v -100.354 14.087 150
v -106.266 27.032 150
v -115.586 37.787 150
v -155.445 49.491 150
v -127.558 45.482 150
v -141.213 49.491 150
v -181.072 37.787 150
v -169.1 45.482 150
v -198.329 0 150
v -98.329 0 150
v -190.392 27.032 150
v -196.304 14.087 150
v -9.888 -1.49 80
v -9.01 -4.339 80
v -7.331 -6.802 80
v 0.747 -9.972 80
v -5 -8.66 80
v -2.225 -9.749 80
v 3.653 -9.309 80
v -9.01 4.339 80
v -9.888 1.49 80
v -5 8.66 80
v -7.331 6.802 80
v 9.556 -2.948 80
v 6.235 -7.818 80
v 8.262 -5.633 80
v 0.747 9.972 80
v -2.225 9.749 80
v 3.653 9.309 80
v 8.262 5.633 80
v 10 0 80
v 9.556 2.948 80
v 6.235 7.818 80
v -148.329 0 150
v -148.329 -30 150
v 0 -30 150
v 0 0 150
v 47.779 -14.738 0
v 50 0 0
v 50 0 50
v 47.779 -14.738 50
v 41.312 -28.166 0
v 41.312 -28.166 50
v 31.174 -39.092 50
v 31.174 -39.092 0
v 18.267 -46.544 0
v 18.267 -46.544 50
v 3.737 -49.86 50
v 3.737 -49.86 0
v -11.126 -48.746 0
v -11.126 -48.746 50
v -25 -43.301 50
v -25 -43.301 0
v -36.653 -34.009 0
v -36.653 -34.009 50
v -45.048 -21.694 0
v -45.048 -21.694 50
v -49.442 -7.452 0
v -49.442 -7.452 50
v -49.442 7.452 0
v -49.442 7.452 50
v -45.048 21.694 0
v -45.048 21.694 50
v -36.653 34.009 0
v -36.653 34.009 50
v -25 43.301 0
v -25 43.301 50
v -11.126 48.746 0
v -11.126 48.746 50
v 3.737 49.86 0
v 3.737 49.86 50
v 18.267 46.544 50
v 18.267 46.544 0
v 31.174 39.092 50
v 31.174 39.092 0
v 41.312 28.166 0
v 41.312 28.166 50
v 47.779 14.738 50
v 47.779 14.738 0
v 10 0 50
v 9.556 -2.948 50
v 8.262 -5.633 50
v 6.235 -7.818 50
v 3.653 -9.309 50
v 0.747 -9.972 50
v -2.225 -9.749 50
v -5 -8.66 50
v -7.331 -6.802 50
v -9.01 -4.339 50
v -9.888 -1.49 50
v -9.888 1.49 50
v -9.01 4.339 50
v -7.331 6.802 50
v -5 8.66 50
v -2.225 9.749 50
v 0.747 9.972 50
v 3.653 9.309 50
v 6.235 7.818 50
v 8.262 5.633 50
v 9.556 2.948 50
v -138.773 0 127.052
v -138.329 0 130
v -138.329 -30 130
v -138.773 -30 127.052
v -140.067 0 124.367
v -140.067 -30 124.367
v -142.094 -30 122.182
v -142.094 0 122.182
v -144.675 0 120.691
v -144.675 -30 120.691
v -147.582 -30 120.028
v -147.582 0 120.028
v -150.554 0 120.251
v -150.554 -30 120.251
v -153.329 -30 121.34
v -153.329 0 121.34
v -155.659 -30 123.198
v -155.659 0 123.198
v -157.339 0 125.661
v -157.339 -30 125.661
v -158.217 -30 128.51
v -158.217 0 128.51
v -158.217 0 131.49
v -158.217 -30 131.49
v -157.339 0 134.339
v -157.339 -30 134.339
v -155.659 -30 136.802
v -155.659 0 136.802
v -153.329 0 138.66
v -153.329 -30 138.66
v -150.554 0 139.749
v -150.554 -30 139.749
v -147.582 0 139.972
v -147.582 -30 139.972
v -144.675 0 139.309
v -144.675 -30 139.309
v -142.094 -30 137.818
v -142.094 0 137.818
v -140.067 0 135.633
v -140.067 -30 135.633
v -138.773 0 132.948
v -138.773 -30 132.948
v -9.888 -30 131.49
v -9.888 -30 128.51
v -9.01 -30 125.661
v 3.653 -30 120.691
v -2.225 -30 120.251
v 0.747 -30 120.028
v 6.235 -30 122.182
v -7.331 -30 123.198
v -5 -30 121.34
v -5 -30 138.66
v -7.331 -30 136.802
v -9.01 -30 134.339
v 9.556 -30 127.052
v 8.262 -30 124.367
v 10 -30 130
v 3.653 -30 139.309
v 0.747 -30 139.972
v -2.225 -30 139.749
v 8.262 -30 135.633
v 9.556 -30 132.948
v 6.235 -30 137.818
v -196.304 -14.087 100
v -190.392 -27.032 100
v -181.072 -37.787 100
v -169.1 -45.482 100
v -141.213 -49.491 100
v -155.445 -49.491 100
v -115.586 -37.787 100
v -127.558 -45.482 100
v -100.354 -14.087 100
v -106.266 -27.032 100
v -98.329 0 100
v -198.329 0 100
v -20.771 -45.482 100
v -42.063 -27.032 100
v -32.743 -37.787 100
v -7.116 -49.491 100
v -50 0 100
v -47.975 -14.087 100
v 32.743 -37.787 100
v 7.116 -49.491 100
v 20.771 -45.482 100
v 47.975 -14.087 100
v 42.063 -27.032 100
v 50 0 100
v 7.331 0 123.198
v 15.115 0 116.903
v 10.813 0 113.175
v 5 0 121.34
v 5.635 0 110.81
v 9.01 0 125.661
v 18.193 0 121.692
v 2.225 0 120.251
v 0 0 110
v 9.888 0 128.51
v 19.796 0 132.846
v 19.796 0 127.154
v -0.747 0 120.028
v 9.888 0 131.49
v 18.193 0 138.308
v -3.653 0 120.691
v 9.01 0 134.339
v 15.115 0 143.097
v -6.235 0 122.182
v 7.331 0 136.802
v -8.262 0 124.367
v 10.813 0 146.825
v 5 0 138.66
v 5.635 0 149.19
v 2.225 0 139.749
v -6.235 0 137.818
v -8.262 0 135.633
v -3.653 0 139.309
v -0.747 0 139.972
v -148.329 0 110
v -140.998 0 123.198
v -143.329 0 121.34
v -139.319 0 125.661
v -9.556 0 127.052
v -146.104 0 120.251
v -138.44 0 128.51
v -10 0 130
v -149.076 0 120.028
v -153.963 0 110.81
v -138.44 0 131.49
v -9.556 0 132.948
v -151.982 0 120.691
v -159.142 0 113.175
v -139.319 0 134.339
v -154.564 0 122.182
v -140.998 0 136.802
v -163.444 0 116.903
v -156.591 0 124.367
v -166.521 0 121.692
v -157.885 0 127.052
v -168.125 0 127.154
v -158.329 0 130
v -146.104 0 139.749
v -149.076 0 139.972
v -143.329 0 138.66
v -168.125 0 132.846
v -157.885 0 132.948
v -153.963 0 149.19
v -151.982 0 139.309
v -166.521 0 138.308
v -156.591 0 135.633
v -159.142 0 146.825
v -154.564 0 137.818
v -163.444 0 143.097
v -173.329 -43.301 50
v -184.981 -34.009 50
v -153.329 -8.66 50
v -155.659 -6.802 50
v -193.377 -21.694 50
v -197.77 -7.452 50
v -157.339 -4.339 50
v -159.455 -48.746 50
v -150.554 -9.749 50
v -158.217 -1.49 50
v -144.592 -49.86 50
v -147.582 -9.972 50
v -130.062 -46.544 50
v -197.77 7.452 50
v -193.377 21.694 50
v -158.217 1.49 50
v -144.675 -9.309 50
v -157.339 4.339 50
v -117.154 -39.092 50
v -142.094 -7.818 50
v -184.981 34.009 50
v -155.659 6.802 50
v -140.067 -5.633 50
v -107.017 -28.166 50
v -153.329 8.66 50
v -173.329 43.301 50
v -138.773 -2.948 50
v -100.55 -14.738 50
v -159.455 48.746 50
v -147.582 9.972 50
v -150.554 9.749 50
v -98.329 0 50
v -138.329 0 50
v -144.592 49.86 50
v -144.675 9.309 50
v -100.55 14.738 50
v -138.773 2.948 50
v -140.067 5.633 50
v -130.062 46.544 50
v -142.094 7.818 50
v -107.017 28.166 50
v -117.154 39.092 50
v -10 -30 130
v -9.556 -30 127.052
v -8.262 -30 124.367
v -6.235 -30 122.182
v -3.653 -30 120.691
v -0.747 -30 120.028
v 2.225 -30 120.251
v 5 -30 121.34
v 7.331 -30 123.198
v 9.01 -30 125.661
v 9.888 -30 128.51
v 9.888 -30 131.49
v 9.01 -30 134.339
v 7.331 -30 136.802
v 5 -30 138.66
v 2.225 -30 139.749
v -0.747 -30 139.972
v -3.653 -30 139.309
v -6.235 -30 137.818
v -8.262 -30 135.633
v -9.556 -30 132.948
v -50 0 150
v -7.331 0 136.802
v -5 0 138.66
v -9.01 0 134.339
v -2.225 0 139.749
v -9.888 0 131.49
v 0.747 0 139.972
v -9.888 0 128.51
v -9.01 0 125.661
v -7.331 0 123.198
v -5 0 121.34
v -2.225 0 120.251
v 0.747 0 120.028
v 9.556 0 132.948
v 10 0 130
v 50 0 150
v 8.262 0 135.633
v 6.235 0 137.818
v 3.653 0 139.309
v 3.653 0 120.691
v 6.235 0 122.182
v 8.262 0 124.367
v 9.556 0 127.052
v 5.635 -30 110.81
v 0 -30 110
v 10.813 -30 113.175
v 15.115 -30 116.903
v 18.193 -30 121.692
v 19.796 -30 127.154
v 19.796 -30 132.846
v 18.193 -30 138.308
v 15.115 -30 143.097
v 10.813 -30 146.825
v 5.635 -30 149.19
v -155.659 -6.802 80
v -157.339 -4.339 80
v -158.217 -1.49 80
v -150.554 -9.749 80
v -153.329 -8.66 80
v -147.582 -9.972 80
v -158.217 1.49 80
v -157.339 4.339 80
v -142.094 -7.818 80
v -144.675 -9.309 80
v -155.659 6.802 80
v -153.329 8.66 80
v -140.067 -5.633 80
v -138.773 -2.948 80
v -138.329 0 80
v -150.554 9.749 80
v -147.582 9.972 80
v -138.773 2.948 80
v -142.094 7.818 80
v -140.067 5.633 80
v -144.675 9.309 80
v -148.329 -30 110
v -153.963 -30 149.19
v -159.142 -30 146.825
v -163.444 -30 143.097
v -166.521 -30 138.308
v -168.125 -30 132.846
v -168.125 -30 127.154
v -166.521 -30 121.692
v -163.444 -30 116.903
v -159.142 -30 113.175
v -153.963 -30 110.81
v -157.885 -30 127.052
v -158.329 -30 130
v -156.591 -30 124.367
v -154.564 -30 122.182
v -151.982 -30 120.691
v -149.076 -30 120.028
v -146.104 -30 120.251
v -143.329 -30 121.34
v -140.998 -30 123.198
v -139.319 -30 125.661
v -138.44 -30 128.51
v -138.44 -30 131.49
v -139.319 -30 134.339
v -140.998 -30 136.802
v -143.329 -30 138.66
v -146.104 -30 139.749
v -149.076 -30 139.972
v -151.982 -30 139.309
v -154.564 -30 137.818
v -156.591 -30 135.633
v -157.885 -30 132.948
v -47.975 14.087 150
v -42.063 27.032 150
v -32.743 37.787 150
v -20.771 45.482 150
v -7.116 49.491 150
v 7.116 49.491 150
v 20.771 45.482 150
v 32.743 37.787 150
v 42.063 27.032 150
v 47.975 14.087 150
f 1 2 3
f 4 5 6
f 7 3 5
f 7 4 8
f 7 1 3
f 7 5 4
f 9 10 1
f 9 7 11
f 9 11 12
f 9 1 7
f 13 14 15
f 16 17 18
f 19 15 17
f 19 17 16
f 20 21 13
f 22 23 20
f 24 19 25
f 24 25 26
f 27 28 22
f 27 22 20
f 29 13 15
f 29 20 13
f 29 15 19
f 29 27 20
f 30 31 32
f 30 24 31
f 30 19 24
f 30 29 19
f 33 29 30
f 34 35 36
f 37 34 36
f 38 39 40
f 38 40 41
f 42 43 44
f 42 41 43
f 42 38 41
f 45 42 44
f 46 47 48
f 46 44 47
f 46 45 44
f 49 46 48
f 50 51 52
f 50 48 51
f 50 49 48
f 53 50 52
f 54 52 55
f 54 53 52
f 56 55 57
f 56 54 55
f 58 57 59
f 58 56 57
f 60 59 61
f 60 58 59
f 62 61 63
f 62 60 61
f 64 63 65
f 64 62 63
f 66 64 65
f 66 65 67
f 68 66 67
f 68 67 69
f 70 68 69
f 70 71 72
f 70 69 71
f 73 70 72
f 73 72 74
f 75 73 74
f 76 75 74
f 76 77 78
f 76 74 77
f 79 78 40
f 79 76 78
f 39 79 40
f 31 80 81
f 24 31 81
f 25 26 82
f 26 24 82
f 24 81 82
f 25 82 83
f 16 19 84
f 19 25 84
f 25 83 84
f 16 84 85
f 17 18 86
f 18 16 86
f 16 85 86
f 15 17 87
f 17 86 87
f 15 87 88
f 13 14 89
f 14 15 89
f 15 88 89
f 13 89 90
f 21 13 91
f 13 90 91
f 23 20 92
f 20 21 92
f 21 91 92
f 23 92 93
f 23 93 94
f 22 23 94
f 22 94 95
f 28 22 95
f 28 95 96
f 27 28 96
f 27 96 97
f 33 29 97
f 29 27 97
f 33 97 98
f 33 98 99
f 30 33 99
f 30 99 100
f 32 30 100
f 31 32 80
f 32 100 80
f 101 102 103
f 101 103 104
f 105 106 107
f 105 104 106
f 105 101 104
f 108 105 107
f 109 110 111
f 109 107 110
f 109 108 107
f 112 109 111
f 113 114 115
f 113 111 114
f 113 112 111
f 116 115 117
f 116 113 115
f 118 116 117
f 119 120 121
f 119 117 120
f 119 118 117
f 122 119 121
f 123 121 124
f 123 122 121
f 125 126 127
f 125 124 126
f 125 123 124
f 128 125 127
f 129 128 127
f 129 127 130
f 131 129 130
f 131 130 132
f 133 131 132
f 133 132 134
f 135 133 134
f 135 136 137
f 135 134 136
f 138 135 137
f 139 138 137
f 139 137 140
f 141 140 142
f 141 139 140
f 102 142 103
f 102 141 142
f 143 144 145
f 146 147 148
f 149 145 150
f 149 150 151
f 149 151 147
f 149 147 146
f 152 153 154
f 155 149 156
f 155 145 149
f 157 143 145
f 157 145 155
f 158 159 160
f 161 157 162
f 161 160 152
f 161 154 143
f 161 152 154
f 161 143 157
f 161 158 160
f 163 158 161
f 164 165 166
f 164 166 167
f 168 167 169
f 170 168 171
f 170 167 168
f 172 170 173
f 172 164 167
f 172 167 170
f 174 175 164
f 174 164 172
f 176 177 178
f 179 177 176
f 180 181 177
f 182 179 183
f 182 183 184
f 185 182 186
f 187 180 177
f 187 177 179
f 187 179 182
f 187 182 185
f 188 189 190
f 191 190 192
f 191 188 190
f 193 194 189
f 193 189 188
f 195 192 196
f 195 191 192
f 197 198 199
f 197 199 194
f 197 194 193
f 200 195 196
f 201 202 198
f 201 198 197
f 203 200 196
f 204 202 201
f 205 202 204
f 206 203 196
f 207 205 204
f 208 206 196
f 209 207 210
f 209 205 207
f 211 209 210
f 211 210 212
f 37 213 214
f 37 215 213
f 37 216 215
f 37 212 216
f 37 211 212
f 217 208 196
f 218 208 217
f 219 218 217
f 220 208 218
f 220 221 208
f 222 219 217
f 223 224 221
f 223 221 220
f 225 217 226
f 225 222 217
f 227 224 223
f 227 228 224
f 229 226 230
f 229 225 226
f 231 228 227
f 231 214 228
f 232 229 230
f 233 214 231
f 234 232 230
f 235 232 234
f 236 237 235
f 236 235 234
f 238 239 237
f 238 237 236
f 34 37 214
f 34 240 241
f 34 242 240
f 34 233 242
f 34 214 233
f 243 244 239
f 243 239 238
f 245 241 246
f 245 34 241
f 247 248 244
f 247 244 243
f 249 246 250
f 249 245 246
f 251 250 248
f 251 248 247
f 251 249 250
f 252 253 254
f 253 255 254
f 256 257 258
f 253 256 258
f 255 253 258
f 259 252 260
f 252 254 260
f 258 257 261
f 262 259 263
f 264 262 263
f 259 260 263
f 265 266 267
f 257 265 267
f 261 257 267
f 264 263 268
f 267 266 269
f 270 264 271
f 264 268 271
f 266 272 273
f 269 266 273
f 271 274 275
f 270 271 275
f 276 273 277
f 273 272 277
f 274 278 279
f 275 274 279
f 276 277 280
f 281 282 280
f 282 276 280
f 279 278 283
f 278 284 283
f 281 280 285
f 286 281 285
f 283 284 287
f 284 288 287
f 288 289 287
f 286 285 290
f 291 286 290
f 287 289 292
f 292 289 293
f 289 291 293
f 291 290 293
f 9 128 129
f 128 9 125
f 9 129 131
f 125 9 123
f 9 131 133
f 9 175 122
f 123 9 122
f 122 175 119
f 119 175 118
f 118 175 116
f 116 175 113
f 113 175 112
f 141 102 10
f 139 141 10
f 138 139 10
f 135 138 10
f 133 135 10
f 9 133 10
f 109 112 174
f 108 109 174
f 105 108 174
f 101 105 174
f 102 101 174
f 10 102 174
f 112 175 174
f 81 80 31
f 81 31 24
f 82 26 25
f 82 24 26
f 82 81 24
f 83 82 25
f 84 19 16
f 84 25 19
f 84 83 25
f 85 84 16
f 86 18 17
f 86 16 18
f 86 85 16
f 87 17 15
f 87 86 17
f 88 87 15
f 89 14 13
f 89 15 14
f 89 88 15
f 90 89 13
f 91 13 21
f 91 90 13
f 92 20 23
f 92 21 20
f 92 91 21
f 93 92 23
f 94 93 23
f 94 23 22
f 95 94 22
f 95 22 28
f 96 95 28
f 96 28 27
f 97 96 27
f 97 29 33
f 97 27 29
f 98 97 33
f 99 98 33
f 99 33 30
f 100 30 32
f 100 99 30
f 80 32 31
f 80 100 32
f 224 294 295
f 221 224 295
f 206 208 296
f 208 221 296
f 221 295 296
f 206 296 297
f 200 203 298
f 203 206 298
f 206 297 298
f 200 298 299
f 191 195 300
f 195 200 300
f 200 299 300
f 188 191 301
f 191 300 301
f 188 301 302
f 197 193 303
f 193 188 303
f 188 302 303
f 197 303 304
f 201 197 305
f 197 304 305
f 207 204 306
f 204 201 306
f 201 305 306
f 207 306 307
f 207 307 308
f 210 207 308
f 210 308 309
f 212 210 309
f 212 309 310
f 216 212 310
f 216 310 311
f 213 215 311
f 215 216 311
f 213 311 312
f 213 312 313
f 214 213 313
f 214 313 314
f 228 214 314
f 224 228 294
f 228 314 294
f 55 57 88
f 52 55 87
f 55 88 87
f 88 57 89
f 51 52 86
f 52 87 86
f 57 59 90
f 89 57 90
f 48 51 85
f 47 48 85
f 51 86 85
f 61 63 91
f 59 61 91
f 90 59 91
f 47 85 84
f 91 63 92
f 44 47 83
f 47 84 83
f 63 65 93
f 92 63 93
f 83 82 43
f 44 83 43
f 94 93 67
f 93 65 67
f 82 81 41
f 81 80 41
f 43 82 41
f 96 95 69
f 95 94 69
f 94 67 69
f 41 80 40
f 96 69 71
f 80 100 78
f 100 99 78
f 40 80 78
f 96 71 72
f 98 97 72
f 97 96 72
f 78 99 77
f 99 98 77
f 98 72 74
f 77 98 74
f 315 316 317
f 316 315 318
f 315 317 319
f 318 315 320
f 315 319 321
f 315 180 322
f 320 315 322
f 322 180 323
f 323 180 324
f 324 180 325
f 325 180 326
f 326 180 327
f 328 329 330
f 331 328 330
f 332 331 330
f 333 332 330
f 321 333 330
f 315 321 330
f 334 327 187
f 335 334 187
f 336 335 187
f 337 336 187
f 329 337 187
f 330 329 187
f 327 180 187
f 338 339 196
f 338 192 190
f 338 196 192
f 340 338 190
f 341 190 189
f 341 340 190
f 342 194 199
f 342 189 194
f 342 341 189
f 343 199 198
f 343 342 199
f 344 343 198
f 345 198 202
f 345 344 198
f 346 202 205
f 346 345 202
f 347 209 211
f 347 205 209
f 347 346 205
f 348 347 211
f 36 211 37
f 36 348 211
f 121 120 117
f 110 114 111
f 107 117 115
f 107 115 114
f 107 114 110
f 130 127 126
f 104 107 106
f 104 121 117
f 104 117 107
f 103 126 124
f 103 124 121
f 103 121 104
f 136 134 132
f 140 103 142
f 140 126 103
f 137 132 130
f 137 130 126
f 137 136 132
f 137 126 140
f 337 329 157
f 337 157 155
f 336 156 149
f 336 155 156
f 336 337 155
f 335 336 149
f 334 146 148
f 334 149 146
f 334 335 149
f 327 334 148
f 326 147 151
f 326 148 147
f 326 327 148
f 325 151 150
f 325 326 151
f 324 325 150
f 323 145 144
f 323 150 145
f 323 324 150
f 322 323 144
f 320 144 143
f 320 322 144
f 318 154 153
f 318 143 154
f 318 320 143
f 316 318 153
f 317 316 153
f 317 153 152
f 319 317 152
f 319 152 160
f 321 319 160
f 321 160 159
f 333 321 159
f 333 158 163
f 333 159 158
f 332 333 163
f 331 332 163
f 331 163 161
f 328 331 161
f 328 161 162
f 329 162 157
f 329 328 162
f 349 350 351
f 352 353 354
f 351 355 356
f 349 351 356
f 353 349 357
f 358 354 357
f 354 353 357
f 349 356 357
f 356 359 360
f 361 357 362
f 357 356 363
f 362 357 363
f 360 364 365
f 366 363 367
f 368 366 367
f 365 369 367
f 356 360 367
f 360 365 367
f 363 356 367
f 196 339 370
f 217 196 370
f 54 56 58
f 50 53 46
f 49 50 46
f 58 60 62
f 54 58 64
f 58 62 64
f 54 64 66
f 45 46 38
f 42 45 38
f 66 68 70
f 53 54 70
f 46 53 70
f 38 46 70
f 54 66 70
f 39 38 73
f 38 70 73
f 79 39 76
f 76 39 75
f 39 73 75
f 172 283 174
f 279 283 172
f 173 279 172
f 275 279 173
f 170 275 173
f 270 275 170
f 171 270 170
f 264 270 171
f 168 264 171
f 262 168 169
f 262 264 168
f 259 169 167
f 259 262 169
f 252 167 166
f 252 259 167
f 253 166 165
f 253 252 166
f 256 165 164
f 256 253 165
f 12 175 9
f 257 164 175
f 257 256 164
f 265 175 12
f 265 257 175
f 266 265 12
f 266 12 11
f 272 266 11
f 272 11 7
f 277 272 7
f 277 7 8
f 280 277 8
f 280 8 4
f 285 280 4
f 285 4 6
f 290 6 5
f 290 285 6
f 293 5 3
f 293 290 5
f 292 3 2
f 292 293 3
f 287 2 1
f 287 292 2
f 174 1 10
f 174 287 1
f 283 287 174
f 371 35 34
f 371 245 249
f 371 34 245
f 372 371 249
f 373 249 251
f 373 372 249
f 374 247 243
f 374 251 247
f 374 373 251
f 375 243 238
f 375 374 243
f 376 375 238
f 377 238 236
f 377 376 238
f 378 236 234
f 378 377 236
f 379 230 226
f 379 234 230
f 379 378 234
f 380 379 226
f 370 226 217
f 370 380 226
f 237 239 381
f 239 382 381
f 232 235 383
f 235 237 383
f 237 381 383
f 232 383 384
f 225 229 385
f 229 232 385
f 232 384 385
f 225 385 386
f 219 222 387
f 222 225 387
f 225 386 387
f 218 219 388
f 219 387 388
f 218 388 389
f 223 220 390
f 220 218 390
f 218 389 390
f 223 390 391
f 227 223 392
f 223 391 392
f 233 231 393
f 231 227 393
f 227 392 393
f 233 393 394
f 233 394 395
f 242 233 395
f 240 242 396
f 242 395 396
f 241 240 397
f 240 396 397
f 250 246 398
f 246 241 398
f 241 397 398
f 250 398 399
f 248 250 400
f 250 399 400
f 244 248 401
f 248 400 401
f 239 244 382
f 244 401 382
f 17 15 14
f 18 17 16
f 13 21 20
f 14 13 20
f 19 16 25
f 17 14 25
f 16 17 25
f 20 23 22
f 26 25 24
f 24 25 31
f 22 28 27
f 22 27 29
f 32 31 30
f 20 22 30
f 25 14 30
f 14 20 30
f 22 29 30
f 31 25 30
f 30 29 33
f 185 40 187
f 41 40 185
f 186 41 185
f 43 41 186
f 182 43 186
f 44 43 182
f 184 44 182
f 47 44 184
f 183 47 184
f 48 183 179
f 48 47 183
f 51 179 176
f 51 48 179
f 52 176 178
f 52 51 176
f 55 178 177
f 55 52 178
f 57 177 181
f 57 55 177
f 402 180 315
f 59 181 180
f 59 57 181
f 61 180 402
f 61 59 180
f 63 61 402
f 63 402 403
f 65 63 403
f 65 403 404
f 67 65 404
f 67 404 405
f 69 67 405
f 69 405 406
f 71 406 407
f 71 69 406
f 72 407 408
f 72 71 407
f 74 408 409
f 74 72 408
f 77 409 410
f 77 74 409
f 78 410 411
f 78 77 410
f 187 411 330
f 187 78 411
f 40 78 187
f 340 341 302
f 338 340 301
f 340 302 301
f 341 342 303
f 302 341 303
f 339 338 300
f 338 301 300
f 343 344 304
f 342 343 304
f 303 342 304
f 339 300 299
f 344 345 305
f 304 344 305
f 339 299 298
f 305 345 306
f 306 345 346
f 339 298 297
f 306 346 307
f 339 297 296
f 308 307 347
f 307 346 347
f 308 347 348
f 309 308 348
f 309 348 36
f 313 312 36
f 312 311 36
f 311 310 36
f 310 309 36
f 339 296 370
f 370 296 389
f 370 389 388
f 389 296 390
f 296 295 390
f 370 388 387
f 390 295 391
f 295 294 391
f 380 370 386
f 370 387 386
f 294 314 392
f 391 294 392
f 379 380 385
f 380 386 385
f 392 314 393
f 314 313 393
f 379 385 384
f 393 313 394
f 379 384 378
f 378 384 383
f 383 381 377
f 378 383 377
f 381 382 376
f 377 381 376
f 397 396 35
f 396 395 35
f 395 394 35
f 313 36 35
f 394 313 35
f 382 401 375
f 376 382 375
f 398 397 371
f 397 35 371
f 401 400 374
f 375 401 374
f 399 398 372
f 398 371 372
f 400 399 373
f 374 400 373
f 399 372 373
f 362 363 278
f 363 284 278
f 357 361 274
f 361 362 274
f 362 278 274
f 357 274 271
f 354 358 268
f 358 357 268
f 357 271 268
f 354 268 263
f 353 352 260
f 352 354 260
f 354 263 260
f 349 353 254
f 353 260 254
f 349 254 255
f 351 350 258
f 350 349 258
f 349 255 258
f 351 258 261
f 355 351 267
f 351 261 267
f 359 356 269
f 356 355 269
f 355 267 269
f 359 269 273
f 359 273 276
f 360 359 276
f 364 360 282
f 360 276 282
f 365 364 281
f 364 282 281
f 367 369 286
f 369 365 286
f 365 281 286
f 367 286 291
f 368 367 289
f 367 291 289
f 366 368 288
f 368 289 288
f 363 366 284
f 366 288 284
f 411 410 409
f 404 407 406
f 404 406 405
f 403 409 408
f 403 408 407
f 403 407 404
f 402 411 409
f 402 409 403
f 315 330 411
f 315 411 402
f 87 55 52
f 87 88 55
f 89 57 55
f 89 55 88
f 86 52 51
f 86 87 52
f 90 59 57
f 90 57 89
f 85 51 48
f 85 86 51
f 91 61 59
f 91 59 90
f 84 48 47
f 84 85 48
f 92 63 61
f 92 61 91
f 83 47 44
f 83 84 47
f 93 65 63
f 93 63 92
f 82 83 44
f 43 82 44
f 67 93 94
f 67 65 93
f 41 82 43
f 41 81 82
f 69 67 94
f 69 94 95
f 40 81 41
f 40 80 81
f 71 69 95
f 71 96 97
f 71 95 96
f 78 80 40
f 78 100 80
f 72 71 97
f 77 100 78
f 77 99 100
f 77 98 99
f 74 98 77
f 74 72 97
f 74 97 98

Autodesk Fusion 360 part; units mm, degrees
sketch "Sketch1" plane through (0, 0, 0) normal (0, 0, 1) x (1, 0, 0) in component "Component"
  circle A0 centre (0, 0) radius 50
  circle A1 centre (0, 0) radius 10
  dimension "d1" = 100
  dimension "d2" = 20
extrude "Extrude1" add sketch "Sketch1" along normal blind 50 contours A0 | A1 makes body 1 in component "Component"
extrude "Extrude2" add sketch "Sketch1" along normal blind 30 from surface at 50 contours A1 bodies 1 in component "Component"
sketch "Sketch1 (2)" plane through (0, 0, 0) normal (0, 0, 1) x (1, 0, 0) in component "Component'"
  circle A0 centre (-214.7924, -0.6712) radius 50
  circle A1 centre (-214.7924, -0.6712) radius 10
  dimension "d8" = 100
  dimension "d9" = 20
extrude "Extrude1'" add sketch "Sketch1 (2)" along normal blind 50 separate body makes body 2 in component "Component'"
extrude "Extrude2'" add sketch "Sketch1 (2)" along normal up to surface (20 mm away) from surface at 30 contours A1 bodies 2 in component "Component'"
sketch "Sketch2" plane through (0, 0, 50) normal (0, 0, 1) x (-1, 0, 0) in component "Component'"
  circle A0 centre (214.7924, 0.6712) radius 50
  line L0 (264.7924, 0.6712) -> (164.7924, 0.6712)
extrude "Extrude3" add sketch "Sketch2" along normal blind 50 contours A0 L0 picked at (207.1995, -18.6751) bodies 2 in component "Component'"
sketch "Sketch3" plane through (0, -0.6712, 0) normal (0, -1, 0) x (1, 0, 0) in component "Component'"
  line L0 (-264.7924, 50) -> (-164.7924, 50)
  line L1 (-164.7924, 50) -> (-164.7924, 100)
  line L2 (-164.7924, 100) -> (-264.7924, 100)
  line L3 (-264.7924, 100) -> (-264.7924, 50)
  circle A0 centre (-214.7924, 80) radius 10
  dimension "d17" = 20
  dimension "d18" = 20
extrude "Extrude4" add sketch "Sketch3" along normal blind 30 contours A0 bodies 2 in component "Component'"
sketch "Sketch1 (3)" plane through (0, 0, 50) normal (0, 0, 1) x (-1, 0, 0) in component "Component''"
  line L0 (527.8882, 20.1997) -> (379.5594, 20.1997)
  arc A0 (379.5594, 20.1997) -> (379.5594, -19.8003) centre (379.5594, 0.1997) ccw
  line L1 (379.5594, -19.8003) -> (527.8882, -19.8003)
  arc A1 (527.8882, -19.8003) -> (527.8882, 20.1997) centre (527.8882, 0.1997) ccw
  line L2 (527.8882, 0.1997) -> (379.5594, 0.1997) construction
  circle A2 centre (527.8882, 0.1997) radius 10
  circle A3 centre (379.5594, 0.1997) radius 10
  dimension "d21" = 20
  dimension "d23" = 10
extrude "Extrude1''" add sketch "Sketch1 (3)" along normal blind 30 separate body makes body 3 in component "Component''"
sketch "Sketch1 (4)" plane through (0, 0, 0) normal (0, 0, 1) x (1, 0, 0) in component "Component'''"
  circle A0 centre (-221.7811, 2.1941) radius 50
  circle A1 centre (-221.7811, 2.1941) radius 10
  dimension "d8_1" = 100
  dimension "d9_1" = 20
extrude "Extrude1'''" add sketch "Sketch1 (4)" along normal blind 50 separate body makes body 4 in component "Component'''"
extrude "Extrude2''" add sketch "Sketch1 (4)" along normal up to surface (20 mm away) from surface at 30 contours A1 bodies 4 in component "Component'''"
sketch "Sketch2 (2)" plane through (0, 0, 50) normal (0, 0, 1) x (-1, 0, 0) in component "Component'''"
  circle A0 centre (221.7811, -2.1941) radius 50
  line L0 (271.7811, -2.1941) -> (171.7811, -2.1941)
extrude "Extrude3'" add sketch "Sketch2 (2)" along normal blind 50 contours A0 L0 picked at (234.7391, -18.4429) bodies 4 in component "Component'''"
sketch "Sketch3 (2)" plane through (0, 2.1941, 0) normal (0, -1, 0) x (1, 0, 0) in component "Component'''"
  line L0 (-271.7811, 50) -> (-171.7811, 50)
  line L1 (-171.7811, 50) -> (-171.7811, 100)
  line L2 (-171.7811, 100) -> (-271.7811, 100)
  line L3 (-271.7811, 100) -> (-271.7811, 50)
  circle A0 centre (-221.7811, 80) radius 10
  dimension "d17_1" = 20
  dimension "d18_1" = 20
extrude "Extrude4'" add sketch "Sketch3 (2)" along normal blind 30 contours A0 bodies 4 in component "Component'''"
component "Component" placed x (1, 0, 0) y (0, 1, 0) z (0, 0, 1) at (0, 0, 0)
component "Component'" placed x (1, 0, 0) y (0, 1, 0) z (0, 0, 1) at (214.7924, 0.6712, 50)
component "Component''" placed x (1, 0, 0) y (0, 0, -1) z (0, 1, 0) at (379.5594, -80, 129.8003)
component "Component'''" placed x (1, 0, 0) y (0, 1, 0) z (0, 0, 1) at (73.4522, -2.1941, 50)
